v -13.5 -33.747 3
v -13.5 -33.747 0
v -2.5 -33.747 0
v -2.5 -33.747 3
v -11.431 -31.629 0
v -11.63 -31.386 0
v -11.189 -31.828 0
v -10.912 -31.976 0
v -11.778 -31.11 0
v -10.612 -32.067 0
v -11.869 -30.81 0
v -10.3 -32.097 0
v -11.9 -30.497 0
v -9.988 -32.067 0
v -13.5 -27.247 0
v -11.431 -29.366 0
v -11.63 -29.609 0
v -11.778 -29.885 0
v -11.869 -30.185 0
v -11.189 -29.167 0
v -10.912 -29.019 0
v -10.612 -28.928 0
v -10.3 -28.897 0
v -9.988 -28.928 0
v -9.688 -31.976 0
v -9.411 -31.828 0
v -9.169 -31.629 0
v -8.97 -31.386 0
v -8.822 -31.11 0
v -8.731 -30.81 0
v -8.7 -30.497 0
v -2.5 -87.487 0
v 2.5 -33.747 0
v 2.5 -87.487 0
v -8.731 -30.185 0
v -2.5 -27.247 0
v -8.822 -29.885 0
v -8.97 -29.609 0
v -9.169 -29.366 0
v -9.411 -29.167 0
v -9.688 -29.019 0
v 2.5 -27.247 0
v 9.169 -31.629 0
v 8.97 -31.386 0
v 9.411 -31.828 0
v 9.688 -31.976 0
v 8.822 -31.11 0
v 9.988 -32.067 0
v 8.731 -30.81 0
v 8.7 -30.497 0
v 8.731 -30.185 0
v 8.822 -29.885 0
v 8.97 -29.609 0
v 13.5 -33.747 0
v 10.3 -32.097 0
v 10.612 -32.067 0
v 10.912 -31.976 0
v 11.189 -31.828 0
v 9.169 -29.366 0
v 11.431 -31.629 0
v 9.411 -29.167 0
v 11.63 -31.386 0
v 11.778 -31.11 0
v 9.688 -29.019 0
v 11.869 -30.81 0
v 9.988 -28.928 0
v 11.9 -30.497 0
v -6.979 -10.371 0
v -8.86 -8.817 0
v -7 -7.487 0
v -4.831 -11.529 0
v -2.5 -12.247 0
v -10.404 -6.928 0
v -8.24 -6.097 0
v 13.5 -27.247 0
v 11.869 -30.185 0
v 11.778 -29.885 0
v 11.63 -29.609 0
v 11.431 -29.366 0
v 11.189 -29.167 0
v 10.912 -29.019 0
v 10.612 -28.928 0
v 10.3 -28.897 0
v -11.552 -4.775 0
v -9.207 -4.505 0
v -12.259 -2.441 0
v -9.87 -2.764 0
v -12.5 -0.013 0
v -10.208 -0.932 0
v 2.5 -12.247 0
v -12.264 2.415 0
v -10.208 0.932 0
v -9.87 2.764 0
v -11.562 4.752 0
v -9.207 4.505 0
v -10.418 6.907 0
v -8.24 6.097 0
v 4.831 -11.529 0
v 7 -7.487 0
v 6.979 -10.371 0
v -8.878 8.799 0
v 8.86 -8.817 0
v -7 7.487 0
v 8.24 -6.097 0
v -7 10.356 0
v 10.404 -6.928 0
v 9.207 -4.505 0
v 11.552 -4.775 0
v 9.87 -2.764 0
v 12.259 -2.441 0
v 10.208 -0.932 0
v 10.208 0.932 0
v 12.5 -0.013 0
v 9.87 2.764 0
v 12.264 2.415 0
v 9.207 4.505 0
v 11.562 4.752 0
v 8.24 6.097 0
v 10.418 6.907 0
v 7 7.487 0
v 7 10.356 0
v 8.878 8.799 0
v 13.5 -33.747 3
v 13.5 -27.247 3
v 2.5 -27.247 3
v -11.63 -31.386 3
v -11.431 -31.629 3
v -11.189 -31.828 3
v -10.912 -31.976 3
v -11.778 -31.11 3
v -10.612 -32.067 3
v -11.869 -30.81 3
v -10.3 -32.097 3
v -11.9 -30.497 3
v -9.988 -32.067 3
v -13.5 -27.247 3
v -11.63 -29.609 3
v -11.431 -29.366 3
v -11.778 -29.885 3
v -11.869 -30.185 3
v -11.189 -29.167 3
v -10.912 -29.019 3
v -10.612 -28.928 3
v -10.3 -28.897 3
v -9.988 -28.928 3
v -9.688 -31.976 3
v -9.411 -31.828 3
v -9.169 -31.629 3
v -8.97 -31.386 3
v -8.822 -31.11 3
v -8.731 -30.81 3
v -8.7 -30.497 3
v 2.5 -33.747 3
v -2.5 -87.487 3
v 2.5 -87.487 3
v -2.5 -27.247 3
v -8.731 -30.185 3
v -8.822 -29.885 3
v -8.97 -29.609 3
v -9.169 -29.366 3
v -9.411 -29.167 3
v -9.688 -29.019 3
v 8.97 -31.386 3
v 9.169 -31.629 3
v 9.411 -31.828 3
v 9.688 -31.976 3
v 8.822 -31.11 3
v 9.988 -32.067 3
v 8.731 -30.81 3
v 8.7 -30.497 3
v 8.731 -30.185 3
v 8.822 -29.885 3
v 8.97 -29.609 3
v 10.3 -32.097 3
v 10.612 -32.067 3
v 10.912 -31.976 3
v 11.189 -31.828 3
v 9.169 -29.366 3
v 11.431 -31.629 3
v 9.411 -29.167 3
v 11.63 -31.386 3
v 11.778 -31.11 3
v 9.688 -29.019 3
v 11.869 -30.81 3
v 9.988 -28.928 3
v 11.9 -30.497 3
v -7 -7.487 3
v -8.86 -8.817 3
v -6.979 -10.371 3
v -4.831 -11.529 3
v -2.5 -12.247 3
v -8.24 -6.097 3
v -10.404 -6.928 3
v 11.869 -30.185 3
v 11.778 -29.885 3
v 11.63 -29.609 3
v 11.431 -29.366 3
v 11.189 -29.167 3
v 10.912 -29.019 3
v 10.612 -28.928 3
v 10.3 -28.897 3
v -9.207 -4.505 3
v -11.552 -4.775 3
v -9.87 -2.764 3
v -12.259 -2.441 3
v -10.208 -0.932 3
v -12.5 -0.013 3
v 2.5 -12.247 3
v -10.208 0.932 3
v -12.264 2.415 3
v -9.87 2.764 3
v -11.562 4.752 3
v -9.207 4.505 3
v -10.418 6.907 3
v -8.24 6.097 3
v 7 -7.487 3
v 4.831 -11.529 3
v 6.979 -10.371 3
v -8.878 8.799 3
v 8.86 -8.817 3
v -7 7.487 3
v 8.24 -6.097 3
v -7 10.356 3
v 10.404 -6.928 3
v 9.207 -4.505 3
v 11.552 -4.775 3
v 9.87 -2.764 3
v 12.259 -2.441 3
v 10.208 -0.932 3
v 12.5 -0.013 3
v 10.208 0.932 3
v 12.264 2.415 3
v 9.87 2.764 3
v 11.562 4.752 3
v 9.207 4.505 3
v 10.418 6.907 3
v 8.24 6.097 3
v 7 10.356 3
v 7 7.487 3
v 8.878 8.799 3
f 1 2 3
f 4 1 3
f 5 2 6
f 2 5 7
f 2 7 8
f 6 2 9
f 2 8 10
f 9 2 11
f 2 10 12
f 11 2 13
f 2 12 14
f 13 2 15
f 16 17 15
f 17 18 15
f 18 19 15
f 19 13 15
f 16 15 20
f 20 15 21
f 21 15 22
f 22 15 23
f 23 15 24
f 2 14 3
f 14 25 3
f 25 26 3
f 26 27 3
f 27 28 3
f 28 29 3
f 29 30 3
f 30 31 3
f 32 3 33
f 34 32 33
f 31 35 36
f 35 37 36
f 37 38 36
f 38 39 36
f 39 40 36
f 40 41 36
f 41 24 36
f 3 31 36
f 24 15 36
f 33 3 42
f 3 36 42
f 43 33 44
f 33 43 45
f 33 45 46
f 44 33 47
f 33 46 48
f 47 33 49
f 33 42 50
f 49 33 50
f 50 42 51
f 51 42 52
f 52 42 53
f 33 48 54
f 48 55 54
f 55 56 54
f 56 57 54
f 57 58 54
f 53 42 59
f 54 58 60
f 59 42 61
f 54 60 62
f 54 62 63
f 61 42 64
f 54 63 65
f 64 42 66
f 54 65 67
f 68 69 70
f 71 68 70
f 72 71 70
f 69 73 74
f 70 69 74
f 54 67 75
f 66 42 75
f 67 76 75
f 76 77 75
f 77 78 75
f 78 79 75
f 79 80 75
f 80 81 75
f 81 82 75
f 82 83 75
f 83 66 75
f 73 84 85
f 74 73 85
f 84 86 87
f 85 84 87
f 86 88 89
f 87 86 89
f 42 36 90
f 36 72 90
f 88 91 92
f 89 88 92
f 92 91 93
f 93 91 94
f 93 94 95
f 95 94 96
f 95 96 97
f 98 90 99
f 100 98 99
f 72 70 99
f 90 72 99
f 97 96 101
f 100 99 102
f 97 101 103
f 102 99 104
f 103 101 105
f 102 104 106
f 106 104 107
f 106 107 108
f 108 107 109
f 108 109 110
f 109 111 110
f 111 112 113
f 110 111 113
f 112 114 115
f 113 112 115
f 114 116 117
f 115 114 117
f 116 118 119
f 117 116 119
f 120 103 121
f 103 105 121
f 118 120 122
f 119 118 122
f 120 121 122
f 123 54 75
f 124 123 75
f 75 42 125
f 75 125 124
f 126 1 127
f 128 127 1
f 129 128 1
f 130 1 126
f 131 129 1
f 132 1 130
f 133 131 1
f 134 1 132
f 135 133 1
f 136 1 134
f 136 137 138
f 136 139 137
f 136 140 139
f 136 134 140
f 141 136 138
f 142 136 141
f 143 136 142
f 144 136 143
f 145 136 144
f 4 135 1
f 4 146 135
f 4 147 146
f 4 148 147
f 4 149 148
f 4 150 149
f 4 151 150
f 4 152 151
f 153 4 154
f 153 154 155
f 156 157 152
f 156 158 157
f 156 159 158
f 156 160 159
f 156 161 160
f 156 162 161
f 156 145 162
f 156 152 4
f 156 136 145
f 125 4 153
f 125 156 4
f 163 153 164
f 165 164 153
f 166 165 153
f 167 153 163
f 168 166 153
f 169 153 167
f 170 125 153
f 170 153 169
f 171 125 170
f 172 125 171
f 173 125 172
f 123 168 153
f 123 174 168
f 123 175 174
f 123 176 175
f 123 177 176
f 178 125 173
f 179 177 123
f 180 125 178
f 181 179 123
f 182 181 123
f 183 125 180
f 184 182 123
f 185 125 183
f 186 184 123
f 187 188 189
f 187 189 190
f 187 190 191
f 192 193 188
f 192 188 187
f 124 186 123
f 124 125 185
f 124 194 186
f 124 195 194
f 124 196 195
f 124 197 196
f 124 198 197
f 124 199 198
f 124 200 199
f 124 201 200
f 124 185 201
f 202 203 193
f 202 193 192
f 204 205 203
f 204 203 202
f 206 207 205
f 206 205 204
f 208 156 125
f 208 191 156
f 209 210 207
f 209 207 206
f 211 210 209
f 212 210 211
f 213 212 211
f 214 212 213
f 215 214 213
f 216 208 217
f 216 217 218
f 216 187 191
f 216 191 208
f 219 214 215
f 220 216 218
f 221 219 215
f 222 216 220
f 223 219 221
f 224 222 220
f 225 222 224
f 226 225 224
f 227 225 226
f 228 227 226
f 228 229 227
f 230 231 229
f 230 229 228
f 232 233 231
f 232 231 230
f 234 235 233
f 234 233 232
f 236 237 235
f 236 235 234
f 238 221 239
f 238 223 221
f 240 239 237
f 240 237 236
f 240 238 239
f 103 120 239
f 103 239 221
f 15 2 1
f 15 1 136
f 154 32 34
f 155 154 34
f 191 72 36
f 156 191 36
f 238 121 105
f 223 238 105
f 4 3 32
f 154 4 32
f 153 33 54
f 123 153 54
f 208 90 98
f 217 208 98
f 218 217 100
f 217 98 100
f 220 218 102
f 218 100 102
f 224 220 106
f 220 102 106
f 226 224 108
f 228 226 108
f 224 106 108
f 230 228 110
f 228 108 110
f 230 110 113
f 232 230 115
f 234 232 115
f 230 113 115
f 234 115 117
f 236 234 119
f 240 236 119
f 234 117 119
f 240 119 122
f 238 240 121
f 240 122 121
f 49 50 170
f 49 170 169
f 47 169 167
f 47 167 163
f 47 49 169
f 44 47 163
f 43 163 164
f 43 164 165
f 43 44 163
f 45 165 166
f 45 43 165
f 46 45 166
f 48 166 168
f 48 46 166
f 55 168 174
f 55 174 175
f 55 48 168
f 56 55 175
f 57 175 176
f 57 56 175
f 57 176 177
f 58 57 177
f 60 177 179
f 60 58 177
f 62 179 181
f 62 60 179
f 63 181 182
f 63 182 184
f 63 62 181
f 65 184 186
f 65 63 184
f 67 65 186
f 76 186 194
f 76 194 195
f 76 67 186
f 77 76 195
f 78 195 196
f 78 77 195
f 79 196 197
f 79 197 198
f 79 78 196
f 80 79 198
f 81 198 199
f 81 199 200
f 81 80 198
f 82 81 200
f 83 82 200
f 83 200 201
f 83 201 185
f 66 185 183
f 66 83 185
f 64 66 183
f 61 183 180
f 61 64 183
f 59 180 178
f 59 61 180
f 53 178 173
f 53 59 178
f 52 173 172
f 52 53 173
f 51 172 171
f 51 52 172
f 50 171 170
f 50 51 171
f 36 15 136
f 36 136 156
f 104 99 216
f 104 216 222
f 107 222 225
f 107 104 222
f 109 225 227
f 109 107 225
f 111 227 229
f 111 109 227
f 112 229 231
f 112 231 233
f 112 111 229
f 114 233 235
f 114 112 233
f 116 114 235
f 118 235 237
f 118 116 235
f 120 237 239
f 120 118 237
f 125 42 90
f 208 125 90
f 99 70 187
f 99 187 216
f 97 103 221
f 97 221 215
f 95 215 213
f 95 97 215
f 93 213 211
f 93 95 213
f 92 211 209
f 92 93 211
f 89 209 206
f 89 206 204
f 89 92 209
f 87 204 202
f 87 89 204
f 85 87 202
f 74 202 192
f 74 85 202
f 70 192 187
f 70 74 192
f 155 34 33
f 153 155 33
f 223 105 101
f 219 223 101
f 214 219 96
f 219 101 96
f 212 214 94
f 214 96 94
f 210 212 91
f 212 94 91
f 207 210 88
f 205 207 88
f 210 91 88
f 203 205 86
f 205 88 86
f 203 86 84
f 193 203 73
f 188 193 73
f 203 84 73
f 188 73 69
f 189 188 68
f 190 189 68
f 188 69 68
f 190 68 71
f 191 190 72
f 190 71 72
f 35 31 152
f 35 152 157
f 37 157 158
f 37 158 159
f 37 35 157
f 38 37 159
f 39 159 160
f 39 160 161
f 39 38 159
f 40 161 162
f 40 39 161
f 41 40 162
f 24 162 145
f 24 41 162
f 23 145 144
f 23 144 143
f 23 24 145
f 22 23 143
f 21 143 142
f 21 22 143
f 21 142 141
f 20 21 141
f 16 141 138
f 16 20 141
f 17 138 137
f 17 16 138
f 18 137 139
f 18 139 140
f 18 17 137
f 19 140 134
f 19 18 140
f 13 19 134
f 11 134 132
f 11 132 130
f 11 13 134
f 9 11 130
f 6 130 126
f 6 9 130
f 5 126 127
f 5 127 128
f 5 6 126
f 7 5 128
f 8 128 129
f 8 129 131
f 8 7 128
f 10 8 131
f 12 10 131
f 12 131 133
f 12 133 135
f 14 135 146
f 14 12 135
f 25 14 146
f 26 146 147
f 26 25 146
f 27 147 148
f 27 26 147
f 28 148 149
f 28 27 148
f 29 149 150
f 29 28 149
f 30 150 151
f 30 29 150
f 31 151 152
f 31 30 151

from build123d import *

# Parameters (mm, degrees)
BOSS_EXTRUDE1_DEPTH = 3
SKETCH3_W           = 27
SKETCH3_H           = 6.5
SKETCH3_R           = 1.6
BOSS_EXTRUDE2_DEPTH = 3


with BuildPart() as part:
    # Sketch1 → Boss-Extrude1 (new body)
    with BuildSketch(Plane.XY):
        with BuildLine():
            Line((2.5, -87.48740775), (2.5, -12.247448714))
            ThreePointArc((2.5, -12.247448714), (12.259414932, -2.440644491), (7, 10.356157589))
            Line((7, 10.356157589), (-7, 10.356157589))
            ThreePointArc((-7, 10.356157589), (-12.259414932, -2.440644491), (-2.5, -12.247448714))
            Line((-2.5, -12.247448714), (-2.5, -87.48740775))
            Line((-2.5, -87.48740775), (2.5, -87.48740775))
        make_face()
        with BuildLine():
            ThreePointArc((7, -7.487489566), (10.25, 0), (7, 7.487489566))
            Line((7, 7.487489566), (-7, 7.487489566))
            ThreePointArc((-7, 7.487489566), (-10.25, 0), (-7, -7.487489566))
            Line((-7, -7.487489566), (7, -7.487489566))
        make_face(mode=Mode.SUBTRACT)
    extrude(amount=BOSS_EXTRUDE1_DEPTH)

    # Sketch3 → Boss-Extrude2 (add)
    with BuildSketch(Plane.XY):
        with Locations((0, -30.497448714)):
            Rectangle(SKETCH3_W, SKETCH3_H)
        with Locations((-10.3, -30.497448714)):
            Circle(SKETCH3_R, mode=Mode.SUBTRACT)
        with Locations(Location((10.3, -30.497448714, 0), (0, 0, 180))):
            Circle(SKETCH3_R, mode=Mode.SUBTRACT)
    extrude(amount=BOSS_EXTRUDE2_DEPTH)


solid = part.part
